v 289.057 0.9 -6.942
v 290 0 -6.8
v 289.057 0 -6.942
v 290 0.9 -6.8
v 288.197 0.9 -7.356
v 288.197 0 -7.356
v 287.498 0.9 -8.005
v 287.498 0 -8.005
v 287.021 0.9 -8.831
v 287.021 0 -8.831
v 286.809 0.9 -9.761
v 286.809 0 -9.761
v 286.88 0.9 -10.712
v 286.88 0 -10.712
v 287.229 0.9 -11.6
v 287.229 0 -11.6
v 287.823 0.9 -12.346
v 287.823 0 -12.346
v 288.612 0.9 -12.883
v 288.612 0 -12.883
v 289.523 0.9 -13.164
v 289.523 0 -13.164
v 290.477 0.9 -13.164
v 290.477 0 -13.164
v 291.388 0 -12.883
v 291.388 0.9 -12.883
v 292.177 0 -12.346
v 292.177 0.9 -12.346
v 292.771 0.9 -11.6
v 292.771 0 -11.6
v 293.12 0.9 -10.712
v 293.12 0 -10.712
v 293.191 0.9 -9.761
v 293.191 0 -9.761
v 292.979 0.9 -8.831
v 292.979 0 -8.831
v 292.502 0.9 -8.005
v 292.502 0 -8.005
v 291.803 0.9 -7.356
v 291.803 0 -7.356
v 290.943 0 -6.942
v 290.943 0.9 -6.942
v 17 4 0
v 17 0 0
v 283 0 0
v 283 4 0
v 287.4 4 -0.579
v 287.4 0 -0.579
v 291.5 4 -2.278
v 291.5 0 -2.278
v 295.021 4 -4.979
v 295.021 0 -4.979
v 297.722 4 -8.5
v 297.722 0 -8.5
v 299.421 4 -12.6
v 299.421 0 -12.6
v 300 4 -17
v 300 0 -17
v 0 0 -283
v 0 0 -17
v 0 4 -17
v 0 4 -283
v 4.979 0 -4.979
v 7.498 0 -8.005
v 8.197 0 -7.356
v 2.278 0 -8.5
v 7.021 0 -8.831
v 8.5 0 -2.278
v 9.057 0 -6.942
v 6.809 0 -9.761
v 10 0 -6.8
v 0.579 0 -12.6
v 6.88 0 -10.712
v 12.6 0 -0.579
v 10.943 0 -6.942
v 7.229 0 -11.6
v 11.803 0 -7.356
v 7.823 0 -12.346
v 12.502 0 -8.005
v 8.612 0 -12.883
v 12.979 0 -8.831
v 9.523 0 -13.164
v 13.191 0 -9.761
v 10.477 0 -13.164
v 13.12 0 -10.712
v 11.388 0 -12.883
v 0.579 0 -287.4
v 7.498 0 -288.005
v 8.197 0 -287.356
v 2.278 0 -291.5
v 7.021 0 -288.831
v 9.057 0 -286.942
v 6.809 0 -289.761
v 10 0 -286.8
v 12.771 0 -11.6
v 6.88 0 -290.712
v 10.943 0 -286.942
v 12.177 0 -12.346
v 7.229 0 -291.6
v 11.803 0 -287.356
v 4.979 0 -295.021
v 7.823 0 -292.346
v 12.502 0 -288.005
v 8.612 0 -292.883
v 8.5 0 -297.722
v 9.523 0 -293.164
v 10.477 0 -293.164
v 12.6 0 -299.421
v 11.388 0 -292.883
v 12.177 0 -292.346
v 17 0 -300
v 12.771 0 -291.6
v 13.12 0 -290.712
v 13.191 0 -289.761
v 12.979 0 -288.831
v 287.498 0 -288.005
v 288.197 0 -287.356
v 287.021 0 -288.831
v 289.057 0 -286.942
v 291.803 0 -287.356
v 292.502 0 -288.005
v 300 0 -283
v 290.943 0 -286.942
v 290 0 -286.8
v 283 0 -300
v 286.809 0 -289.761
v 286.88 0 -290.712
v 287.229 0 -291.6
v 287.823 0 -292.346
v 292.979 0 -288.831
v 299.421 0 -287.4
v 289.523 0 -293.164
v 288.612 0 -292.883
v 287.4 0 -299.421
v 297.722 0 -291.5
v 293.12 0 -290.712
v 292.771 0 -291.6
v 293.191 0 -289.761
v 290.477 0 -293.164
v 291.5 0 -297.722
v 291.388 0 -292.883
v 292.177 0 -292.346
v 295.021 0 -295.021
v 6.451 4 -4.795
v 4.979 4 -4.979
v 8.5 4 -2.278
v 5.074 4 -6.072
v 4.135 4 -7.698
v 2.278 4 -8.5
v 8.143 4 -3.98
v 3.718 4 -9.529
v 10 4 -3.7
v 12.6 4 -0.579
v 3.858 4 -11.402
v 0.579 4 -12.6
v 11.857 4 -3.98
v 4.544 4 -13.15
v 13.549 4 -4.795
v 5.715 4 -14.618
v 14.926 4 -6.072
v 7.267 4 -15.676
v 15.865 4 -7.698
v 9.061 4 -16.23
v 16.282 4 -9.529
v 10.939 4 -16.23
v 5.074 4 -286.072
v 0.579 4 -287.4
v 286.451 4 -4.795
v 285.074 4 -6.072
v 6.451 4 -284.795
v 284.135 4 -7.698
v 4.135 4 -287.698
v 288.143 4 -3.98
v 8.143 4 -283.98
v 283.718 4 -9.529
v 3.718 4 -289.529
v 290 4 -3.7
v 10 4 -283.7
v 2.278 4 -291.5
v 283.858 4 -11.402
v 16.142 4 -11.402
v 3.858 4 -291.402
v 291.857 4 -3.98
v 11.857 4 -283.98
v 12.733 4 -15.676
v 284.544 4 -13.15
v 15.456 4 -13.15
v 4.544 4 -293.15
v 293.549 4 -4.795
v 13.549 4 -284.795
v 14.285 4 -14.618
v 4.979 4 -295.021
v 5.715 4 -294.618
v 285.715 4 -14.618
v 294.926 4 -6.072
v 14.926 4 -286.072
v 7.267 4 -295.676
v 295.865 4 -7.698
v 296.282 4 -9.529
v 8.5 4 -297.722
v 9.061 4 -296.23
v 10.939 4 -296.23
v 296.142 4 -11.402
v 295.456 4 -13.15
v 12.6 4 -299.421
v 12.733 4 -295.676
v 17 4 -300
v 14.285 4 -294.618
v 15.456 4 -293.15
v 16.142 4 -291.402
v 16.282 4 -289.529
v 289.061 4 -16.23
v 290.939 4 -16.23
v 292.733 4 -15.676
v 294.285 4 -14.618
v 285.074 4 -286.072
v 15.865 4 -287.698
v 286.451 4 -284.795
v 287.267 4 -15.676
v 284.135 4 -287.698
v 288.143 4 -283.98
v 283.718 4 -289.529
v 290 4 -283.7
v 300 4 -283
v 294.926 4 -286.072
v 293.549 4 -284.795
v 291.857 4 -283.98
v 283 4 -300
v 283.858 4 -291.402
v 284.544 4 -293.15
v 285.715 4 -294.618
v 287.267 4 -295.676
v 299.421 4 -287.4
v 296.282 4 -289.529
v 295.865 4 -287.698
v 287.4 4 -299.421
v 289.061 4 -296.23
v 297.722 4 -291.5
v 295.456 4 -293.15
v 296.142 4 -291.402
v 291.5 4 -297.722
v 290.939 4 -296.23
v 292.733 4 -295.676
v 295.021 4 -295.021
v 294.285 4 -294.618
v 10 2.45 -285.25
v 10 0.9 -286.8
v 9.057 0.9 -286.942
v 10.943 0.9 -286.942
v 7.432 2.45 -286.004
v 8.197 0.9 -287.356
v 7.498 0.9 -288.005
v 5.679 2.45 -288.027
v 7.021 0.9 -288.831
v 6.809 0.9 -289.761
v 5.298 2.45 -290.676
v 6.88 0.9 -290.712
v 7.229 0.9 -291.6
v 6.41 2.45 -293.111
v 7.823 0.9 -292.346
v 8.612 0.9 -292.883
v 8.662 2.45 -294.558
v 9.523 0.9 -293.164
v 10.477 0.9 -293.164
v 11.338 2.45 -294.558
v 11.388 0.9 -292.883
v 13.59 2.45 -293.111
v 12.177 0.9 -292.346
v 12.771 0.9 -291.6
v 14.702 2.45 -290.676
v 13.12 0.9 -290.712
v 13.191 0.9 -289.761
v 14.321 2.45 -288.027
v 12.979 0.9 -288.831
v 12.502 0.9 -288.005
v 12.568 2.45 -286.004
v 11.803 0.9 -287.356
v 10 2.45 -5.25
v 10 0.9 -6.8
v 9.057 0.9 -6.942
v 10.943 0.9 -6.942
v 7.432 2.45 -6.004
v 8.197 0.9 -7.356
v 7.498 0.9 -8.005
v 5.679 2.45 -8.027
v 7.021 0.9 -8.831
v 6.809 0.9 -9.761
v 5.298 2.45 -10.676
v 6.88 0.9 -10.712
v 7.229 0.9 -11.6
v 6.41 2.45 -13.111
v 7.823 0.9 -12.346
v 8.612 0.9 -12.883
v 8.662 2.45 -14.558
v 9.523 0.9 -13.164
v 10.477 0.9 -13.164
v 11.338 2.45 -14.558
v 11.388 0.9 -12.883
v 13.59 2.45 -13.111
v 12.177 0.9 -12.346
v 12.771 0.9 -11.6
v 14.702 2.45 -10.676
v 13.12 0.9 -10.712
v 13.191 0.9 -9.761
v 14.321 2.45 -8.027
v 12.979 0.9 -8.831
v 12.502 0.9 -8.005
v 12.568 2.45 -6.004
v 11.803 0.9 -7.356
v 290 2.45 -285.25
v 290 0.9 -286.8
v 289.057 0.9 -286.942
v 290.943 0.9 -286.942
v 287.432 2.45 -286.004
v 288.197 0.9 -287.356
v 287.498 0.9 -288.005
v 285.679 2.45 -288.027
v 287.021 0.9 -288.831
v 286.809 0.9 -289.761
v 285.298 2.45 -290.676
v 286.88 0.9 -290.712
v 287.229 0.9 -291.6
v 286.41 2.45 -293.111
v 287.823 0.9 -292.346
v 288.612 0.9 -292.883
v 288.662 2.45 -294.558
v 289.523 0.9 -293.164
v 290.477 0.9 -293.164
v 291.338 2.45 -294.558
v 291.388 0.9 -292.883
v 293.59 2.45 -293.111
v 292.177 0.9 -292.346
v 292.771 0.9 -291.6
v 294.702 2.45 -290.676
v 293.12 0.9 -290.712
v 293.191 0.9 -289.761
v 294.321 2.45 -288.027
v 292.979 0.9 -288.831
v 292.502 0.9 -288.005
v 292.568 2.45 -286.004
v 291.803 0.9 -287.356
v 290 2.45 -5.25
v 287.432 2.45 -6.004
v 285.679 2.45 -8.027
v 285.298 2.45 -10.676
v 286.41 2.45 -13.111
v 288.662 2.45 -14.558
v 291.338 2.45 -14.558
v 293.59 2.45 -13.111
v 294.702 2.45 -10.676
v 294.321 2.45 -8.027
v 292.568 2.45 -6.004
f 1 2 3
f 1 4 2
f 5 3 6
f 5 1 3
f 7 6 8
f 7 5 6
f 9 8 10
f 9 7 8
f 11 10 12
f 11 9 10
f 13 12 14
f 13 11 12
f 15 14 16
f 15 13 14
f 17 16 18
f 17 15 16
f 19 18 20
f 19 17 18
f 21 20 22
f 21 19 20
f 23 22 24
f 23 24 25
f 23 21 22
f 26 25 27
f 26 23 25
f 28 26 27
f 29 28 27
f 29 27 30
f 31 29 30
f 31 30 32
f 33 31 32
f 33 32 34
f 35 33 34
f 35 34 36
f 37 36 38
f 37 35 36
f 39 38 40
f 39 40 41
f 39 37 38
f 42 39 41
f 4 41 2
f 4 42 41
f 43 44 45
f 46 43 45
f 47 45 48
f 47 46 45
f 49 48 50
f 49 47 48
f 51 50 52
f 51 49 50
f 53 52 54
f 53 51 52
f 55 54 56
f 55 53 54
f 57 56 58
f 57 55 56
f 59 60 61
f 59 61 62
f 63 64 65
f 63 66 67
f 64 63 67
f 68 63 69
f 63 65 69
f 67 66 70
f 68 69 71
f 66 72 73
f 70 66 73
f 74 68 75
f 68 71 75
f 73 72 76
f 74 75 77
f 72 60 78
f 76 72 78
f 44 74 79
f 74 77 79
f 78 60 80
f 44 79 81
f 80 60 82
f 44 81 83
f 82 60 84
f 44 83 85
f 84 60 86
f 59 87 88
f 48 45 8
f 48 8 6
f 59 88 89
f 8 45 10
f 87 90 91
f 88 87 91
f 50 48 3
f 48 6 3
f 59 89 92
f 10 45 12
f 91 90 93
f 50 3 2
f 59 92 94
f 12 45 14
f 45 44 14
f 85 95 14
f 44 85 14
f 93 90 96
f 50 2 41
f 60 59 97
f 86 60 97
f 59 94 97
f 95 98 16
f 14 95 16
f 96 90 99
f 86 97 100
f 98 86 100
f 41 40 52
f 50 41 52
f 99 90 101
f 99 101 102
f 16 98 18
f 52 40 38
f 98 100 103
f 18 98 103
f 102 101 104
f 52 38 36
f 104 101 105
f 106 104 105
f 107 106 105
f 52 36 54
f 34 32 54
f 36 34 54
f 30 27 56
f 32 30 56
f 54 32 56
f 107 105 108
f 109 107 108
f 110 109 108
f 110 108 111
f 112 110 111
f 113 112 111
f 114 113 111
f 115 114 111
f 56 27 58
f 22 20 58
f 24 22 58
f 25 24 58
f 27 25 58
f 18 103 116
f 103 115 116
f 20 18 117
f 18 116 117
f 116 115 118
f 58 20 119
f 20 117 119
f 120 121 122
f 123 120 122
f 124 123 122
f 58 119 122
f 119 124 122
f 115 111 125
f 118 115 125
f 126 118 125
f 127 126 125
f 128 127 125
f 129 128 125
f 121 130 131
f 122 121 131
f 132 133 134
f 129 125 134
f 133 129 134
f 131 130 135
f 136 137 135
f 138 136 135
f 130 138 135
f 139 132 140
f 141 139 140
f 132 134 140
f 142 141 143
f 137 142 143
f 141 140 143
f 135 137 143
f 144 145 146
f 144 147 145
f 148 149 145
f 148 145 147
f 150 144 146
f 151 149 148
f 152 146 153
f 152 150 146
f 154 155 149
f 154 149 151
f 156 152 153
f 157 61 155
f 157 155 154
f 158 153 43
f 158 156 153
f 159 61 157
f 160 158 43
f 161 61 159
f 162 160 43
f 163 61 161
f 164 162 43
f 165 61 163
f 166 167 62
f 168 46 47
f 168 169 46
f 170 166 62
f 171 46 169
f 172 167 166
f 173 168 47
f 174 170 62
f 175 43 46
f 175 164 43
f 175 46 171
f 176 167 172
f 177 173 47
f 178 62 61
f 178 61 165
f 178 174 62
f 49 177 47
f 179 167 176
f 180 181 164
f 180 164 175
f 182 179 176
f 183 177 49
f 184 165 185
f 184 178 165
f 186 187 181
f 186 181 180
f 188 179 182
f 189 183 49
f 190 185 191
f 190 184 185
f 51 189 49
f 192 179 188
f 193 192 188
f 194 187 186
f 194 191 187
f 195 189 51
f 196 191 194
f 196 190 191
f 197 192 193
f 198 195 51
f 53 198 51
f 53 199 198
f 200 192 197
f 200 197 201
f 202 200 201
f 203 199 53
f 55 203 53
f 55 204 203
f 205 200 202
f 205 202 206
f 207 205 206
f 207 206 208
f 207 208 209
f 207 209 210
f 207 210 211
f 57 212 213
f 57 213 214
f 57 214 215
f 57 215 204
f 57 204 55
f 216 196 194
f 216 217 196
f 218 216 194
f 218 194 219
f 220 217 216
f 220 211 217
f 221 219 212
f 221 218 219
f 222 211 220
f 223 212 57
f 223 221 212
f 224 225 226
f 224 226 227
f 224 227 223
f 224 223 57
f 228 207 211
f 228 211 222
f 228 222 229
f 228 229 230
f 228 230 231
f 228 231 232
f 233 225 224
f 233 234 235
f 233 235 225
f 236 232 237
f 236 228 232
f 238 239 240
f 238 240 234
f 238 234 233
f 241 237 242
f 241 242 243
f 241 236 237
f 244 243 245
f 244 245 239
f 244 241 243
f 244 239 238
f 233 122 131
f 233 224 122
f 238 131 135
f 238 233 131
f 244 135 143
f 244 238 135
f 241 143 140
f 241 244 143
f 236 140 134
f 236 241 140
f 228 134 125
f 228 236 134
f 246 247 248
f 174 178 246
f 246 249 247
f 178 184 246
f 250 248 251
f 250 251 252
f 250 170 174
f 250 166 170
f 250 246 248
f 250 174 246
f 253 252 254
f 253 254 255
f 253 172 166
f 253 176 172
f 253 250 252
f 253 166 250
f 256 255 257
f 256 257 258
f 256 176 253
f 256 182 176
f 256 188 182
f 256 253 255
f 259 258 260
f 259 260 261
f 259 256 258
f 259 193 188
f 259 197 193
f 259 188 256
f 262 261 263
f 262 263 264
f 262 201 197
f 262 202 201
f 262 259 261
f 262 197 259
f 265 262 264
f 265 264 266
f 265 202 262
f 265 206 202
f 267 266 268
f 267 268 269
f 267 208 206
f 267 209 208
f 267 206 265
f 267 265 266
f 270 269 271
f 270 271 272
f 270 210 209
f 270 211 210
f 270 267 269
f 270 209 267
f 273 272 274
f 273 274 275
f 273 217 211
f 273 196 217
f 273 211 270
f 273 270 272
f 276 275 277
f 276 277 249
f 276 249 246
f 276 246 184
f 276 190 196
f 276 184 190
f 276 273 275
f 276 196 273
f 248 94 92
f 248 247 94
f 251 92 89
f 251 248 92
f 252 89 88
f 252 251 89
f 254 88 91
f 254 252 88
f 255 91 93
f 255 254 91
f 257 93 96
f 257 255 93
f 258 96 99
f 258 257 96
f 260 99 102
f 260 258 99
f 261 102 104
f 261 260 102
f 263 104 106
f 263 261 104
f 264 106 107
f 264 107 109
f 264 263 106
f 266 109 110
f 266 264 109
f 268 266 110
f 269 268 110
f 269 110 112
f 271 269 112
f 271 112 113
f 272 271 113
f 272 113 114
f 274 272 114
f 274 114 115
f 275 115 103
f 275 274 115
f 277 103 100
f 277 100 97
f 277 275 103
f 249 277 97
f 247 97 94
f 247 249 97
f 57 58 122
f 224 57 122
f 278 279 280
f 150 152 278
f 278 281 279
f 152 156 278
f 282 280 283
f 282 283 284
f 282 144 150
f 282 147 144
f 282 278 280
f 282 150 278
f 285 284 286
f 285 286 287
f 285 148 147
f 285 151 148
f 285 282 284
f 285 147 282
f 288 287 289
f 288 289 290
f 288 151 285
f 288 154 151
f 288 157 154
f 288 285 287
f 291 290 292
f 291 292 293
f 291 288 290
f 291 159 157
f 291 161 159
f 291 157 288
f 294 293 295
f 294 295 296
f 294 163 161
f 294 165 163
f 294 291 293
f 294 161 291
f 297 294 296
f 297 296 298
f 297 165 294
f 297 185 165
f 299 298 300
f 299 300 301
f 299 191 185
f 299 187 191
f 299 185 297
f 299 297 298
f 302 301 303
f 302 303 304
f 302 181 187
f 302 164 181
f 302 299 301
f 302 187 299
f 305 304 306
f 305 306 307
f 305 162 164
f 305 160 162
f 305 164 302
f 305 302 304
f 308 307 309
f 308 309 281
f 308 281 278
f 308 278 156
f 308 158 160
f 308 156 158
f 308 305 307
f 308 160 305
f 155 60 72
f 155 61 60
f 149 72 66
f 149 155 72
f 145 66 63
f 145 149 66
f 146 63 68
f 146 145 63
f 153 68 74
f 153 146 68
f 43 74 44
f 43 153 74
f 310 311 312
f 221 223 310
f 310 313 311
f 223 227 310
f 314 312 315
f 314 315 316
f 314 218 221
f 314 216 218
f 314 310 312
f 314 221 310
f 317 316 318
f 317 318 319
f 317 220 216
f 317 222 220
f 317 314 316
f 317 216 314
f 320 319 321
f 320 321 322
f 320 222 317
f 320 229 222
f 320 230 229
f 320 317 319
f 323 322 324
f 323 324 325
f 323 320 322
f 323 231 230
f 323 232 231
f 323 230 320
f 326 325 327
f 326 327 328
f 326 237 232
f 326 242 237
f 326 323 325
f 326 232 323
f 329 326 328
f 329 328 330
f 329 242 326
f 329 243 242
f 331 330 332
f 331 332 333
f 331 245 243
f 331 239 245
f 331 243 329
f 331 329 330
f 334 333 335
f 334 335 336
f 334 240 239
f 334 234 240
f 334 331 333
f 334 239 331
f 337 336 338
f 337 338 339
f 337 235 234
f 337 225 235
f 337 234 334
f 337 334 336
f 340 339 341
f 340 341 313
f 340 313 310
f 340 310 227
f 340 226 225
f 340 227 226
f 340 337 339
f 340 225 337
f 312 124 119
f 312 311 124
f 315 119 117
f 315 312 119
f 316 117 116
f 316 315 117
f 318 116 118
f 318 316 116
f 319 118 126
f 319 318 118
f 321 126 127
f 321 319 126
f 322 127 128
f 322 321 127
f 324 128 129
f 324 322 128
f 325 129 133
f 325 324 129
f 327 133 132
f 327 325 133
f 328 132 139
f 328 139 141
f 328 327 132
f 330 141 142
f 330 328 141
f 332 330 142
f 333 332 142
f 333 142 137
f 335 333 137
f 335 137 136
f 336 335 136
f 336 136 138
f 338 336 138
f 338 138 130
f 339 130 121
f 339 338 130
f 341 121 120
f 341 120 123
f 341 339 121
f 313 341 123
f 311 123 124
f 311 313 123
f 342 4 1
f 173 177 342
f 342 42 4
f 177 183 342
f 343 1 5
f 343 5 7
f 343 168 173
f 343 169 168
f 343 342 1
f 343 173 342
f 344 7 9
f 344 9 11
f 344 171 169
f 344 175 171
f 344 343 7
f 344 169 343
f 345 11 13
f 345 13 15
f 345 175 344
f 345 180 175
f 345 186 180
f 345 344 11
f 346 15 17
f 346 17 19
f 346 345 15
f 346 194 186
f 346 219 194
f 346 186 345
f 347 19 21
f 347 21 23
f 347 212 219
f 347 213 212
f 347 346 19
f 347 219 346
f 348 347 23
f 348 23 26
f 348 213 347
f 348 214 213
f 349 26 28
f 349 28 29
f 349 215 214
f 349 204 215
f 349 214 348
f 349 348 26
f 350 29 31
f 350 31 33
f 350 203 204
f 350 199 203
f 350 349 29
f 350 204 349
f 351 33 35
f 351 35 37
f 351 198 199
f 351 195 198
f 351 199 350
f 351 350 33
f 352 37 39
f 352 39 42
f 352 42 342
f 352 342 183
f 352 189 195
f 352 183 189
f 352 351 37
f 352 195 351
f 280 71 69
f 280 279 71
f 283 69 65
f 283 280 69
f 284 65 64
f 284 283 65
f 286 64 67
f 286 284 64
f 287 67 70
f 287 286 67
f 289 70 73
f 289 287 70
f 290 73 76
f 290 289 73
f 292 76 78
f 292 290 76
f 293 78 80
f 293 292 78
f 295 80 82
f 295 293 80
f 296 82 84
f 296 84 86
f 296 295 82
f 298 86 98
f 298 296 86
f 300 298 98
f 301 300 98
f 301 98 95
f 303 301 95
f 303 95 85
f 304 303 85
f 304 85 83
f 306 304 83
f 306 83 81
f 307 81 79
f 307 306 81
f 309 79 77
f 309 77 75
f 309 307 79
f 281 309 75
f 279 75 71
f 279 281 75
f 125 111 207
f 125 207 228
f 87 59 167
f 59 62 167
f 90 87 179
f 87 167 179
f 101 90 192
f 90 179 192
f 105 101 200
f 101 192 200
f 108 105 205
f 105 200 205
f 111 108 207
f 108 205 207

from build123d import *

# Parameters (mm, degrees)
SKIZZE1_W                                   = 300
SKIZZE1_H                                   = 300
AUFSATZ_LINEAR_AUSTRAGEN1_DEPTH             = 4
VERRUNDUNG1_R                               = 17
FORMSENKUNG_F_R_M6_SENKSCHRAUBE_MIT_2_COUNT = 2
FORMSENKUNG_F_R_M6_SENKSCHRAUBE_MIT_2_PITCH = 280
FORMSENKUNG_F_R_M6_SENKSCHRAUBE_MIT_3_COUNT = 2
FORMSENKUNG_F_R_M6_SENKSCHRAUBE_MIT_3_PITCH = 395.979797464
FORMSENKUNG_F_R_M6_SENKSCHRAUBE_MIT_4_COUNT = 2
FORMSENKUNG_F_R_M6_SENKSCHRAUBE_MIT_4_PITCH = 280


with BuildPart() as part:
    # Skizze1 → Aufsatz-Linear austragen1 (new body)
    with BuildSketch(Plane(origin=(0, 0, 0), x_dir=(1, 0, 0), z_dir=(0, 1, 0))):
        with Locations((150, 150)):
            Rectangle(SKIZZE1_W, SKIZZE1_H)
    extrude(amount=AUFSATZ_LINEAR_AUSTRAGEN1_DEPTH)

    # Verrundung1
    verrundung1_edges = [part.edges().sort_by_distance(p)[0] for p in [
        (0, 2, -300),
        (300, 2, -300),
        (300, 2, 0),
        (0, 2, 0),
    ]]
    fillet(verrundung1_edges, radius=VERRUNDUNG1_R)

    # Skizze2 → Formsenkung für M6 Senkschraube mit Schlitz/Kreuzschlitz1 (revolve, cut)
    with BuildSketch(Plane(origin=(290, 4, -10), x_dir=(0, 0, 1), z_dir=(1, 0, 0))):
        Polygon((0, 0), (0, 4), (3.2, 4), (3.2, 3.1), (6.3, 0), align=None)
    formsenkung_f_r_m6_senkschraube_mit_schl = revolve(axis=Axis((290, 10.35, -10), (0, -1, 0)), mode=Mode.SUBTRACT)

    # Formsenkung f_r M6 Senkschraube mit  2: Formsenkung für M6 Senkschraube mit Schlitz/Kreuzschlitz1 ×2
    with Locations(*[(-i * FORMSENKUNG_F_R_M6_SENKSCHRAUBE_MIT_2_PITCH, 0, 0) for i in range(1, FORMSENKUNG_F_R_M6_SENKSCHRAUBE_MIT_2_COUNT)]):
        add(formsenkung_f_r_m6_senkschraube_mit_schl, mode=Mode.SUBTRACT)

    # Formsenkung f_r M6 Senkschraube mit  3: Formsenkung für M6 Senkschraube mit Schlitz/Kreuzschlitz1 ×2
    with Locations(*[Vector(-0.7071067811865475, 0, -0.7071067811865476) * (i * FORMSENKUNG_F_R_M6_SENKSCHRAUBE_MIT_3_PITCH) for i in range(1, FORMSENKUNG_F_R_M6_SENKSCHRAUBE_MIT_3_COUNT)]):
        add(formsenkung_f_r_m6_senkschraube_mit_schl, mode=Mode.SUBTRACT)

    # Formsenkung f_r M6 Senkschraube mit  4: Formsenkung für M6 Senkschraube mit Schlitz/Kreuzschlitz1 ×2
    with Locations(*[(0, 0, -i * FORMSENKUNG_F_R_M6_SENKSCHRAUBE_MIT_4_PITCH) for i in range(1, FORMSENKUNG_F_R_M6_SENKSCHRAUBE_MIT_4_COUNT)]):
        add(formsenkung_f_r_m6_senkschraube_mit_schl, mode=Mode.SUBTRACT)


solid = part.part
